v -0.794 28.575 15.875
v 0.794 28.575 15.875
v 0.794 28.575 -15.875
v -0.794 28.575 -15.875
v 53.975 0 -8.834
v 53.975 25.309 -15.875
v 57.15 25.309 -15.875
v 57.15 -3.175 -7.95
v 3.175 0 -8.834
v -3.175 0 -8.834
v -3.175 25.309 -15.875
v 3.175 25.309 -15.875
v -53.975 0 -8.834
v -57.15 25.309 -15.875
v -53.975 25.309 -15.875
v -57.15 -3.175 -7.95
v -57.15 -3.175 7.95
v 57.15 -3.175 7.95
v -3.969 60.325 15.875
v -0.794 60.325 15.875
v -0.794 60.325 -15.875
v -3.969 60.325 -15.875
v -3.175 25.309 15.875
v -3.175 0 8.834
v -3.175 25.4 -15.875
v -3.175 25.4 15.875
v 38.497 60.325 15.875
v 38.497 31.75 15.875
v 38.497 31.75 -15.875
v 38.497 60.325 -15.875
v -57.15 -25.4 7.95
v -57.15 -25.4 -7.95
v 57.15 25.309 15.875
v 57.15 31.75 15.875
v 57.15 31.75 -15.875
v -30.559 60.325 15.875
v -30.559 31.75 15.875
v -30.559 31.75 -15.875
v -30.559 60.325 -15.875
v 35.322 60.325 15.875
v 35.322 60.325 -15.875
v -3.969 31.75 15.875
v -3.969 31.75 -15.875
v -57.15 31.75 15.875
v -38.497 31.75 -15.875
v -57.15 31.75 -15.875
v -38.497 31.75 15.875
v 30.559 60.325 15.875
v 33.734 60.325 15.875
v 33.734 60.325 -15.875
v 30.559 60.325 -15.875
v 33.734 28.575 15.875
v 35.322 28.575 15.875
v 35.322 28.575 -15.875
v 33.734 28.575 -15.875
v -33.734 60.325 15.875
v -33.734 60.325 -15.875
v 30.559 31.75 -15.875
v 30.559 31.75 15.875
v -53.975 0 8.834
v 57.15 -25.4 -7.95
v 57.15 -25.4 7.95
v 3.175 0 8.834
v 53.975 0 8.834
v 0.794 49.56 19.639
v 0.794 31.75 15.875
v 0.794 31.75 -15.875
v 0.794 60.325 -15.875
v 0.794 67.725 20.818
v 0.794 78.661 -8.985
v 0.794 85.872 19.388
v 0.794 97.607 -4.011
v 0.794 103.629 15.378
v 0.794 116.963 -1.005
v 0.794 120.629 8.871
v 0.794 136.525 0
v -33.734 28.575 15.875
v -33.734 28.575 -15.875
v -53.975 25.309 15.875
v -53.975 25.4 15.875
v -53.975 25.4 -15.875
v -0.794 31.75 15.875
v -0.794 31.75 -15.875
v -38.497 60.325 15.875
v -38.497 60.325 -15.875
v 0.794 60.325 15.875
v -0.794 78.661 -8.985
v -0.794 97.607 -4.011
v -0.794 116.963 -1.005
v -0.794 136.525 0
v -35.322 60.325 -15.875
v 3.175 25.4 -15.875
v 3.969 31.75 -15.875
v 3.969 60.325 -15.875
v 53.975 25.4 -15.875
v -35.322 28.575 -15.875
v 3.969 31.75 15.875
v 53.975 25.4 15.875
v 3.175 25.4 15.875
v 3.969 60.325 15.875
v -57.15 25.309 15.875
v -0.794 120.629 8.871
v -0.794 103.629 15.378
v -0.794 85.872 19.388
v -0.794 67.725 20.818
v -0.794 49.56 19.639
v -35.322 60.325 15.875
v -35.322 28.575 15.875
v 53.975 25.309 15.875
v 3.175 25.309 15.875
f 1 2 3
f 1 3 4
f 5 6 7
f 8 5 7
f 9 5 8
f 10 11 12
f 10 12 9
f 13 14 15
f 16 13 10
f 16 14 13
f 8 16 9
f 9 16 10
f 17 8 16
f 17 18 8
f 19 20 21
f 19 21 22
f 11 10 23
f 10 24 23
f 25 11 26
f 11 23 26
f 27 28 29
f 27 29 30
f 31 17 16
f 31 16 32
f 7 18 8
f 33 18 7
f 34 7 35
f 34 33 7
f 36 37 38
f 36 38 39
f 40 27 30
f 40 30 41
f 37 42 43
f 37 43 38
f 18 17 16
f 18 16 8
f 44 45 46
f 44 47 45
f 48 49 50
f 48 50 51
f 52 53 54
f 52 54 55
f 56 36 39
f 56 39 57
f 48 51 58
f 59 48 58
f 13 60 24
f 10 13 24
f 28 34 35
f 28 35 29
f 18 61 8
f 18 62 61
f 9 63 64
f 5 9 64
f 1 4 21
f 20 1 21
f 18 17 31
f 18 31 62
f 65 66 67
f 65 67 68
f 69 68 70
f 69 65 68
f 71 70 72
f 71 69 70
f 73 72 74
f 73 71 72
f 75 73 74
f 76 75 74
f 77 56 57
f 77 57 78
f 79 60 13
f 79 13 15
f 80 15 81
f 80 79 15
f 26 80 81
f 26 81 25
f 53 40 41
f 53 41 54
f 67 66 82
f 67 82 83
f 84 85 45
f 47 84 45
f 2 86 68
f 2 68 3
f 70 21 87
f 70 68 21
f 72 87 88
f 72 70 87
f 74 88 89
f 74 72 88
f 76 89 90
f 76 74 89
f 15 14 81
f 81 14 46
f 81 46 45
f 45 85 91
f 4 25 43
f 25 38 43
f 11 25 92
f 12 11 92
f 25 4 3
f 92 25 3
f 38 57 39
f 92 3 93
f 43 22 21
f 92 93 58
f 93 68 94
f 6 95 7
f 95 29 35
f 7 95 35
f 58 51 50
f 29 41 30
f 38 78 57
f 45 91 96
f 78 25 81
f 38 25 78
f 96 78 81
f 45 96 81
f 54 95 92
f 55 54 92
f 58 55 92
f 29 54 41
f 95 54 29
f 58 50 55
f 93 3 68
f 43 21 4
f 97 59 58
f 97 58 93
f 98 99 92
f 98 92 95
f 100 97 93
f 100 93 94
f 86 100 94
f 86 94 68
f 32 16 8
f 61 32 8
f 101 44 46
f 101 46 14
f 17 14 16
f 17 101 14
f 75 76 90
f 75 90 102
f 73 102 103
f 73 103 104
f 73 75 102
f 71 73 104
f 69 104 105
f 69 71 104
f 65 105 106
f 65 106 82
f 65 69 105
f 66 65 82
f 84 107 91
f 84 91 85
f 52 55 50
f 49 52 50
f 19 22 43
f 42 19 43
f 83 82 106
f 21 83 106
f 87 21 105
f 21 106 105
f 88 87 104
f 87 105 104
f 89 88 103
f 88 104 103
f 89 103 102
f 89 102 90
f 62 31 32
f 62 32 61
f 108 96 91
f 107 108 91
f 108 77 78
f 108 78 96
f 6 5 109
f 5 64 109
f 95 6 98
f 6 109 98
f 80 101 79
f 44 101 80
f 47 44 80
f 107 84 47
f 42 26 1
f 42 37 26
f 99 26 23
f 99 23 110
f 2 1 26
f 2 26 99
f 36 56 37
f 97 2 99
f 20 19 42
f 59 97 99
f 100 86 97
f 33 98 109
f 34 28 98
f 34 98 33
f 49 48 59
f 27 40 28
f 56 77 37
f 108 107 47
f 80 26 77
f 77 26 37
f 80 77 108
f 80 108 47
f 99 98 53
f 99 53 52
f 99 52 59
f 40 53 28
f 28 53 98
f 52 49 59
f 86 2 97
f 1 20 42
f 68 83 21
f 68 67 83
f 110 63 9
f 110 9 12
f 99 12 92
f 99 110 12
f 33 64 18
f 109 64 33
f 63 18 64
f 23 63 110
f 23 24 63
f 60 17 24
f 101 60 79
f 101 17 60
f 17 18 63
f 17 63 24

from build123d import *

# Parameters (mm, degrees)
F0_W          = 50.8
F0_H          = 25.4
F1_DEPTH      = 15.875
F1_DEPTH_BACK = 15.875
F2_DEPTH      = 7.9502
F2_DEPTH_BACK = 7.9502
F3_DEPTH      = 15.875
F3_DEPTH_BACK = 15.875
F7_DEPTH      = 57.15
F7_DEPTH_BACK = 57.15
F9_DEPTH      = 0.79375
F9_DEPTH_BACK = 0.79375


# Not quite as in the source:
# - the program builds the solid bodies; features that only make, move or delete a surface that nothing else refers to are left out


with BuildPart() as f1:
    # F0 (on Top) → F1 (new body, two sides)
    with BuildSketch(Plane.XY) as f1_sk:
        Polygon((-57.15, -3.175), (0, -3.175), (57.15, -3.175), (57.15, 28.575), (35.321875, 28.575), (33.734375, 28.575), (32.54375, 28.575), (0.79375, 28.575), (-0.79375, 28.575), (-32.54375, 28.575), (-33.734375, 28.575), (-35.321875, 28.575), (-57.15, 28.575), align=None)
        with Locations((-28.575, 12.7)):
            Rectangle(F0_W, F0_H, mode=Mode.SUBTRACT)
        with Locations((28.575, 12.7)):
            Rectangle(F0_W, F0_H, mode=Mode.SUBTRACT)
        Polygon((-57.15, 31.75), (-57.15, 28.575), (-35.321875, 28.575), (-35.321875, 60.325), (-38.496875, 60.325), (-38.496875, 31.75), align=None)
        Polygon((35.321875, 28.575), (57.15, 28.575), (57.15, 31.75), (38.496875, 31.75), (38.496875, 60.325), (35.321875, 60.325), align=None)
        Polygon((32.54375, 28.575), (33.734375, 28.575), (33.734375, 60.325), (30.559375, 60.325), (30.559375, 31.75), (17.2640625, 31.75), (3.96875, 31.75), (3.96875, 60.325), (0.79375, 60.325), (0.79375, 28.575), align=None)
        Polygon((-33.734375, 60.325), (-33.734375, 28.575), (-32.54375, 28.575), (-0.79375, 28.575), (-0.79375, 60.325), (-3.96875, 60.325), (-3.96875, 31.75), (-17.2640625, 31.75), (-30.559375, 31.75), (-30.559375, 60.325), align=None)
    extrude(amount=F1_DEPTH)
    extrude(f1_sk.sketch, amount=-F1_DEPTH_BACK)

    # F0 (on Top) → F3 (join, two sides)
    with BuildSketch(Plane.XY) as f3_sk:
        Polygon((-33.734375, 60.325), (-33.734375, 28.575), (-32.54375, 28.575), (-0.79375, 28.575), (-0.79375, 60.325), (-3.96875, 60.325), (-3.96875, 31.75), (-17.2640625, 31.75), (-30.559375, 31.75), (-30.559375, 60.325), align=None)
        Polygon((32.54375, 28.575), (33.734375, 28.575), (33.734375, 60.325), (30.559375, 60.325), (30.559375, 31.75), (17.2640625, 31.75), (3.96875, 31.75), (3.96875, 60.325), (0.79375, 60.325), (0.79375, 28.575), align=None)
    extrude(amount=F3_DEPTH)
    extrude(f3_sk.sketch, amount=-F3_DEPTH_BACK)

    # F6 (on Right) → F7 (cut, two sides)
    with BuildSketch(Plane.YZ) as f7_sk:
        Polygon((25.4, -15.9004), (-3.175, -7.9502), (-3.175, -15.9004), align=None)
        Polygon((-3.175, 15.9004), (-3.175, 7.9502), (25.4, 15.9004), align=None)
    extrude(amount=-F7_DEPTH, mode=Mode.SUBTRACT)
    extrude(f7_sk.sketch, amount=F7_DEPTH_BACK, mode=Mode.SUBTRACT)


with BuildPart() as f2:
    # F0 (on Top) → F2 (new body, two sides)
    with BuildSketch(Plane.XY) as f2_sk:
        Polygon((57.15, -3.175), (0, -3.175), (-57.15, -3.175), (-57.15, -25.4), (57.15, -25.4), align=None)
    extrude(amount=F2_DEPTH)
    extrude(f2_sk.sketch, amount=-F2_DEPTH_BACK)


with BuildPart() as f9:
    # F8 (on Right) → F9 (new body, two sides)
    with BuildSketch(Plane.YZ) as f9_sk:
        with BuildLine():
            ThreePointArc((60.325, -15.875), (97.606959116, -4.0109037567), (136.525, 0))
            ThreePointArc((136.525, 0), (85.8723958548, 19.3878126418), (31.75, 15.875))
            Line((31.75, 15.875), (31.75, -15.875))
            Line((31.75, -15.875), (60.325, -15.875))
        make_face()
    extrude(amount=F9_DEPTH)
    extrude(f9_sk.sketch, amount=-F9_DEPTH_BACK)


solid = Compound([f1.part, f2.part, f9.part])
